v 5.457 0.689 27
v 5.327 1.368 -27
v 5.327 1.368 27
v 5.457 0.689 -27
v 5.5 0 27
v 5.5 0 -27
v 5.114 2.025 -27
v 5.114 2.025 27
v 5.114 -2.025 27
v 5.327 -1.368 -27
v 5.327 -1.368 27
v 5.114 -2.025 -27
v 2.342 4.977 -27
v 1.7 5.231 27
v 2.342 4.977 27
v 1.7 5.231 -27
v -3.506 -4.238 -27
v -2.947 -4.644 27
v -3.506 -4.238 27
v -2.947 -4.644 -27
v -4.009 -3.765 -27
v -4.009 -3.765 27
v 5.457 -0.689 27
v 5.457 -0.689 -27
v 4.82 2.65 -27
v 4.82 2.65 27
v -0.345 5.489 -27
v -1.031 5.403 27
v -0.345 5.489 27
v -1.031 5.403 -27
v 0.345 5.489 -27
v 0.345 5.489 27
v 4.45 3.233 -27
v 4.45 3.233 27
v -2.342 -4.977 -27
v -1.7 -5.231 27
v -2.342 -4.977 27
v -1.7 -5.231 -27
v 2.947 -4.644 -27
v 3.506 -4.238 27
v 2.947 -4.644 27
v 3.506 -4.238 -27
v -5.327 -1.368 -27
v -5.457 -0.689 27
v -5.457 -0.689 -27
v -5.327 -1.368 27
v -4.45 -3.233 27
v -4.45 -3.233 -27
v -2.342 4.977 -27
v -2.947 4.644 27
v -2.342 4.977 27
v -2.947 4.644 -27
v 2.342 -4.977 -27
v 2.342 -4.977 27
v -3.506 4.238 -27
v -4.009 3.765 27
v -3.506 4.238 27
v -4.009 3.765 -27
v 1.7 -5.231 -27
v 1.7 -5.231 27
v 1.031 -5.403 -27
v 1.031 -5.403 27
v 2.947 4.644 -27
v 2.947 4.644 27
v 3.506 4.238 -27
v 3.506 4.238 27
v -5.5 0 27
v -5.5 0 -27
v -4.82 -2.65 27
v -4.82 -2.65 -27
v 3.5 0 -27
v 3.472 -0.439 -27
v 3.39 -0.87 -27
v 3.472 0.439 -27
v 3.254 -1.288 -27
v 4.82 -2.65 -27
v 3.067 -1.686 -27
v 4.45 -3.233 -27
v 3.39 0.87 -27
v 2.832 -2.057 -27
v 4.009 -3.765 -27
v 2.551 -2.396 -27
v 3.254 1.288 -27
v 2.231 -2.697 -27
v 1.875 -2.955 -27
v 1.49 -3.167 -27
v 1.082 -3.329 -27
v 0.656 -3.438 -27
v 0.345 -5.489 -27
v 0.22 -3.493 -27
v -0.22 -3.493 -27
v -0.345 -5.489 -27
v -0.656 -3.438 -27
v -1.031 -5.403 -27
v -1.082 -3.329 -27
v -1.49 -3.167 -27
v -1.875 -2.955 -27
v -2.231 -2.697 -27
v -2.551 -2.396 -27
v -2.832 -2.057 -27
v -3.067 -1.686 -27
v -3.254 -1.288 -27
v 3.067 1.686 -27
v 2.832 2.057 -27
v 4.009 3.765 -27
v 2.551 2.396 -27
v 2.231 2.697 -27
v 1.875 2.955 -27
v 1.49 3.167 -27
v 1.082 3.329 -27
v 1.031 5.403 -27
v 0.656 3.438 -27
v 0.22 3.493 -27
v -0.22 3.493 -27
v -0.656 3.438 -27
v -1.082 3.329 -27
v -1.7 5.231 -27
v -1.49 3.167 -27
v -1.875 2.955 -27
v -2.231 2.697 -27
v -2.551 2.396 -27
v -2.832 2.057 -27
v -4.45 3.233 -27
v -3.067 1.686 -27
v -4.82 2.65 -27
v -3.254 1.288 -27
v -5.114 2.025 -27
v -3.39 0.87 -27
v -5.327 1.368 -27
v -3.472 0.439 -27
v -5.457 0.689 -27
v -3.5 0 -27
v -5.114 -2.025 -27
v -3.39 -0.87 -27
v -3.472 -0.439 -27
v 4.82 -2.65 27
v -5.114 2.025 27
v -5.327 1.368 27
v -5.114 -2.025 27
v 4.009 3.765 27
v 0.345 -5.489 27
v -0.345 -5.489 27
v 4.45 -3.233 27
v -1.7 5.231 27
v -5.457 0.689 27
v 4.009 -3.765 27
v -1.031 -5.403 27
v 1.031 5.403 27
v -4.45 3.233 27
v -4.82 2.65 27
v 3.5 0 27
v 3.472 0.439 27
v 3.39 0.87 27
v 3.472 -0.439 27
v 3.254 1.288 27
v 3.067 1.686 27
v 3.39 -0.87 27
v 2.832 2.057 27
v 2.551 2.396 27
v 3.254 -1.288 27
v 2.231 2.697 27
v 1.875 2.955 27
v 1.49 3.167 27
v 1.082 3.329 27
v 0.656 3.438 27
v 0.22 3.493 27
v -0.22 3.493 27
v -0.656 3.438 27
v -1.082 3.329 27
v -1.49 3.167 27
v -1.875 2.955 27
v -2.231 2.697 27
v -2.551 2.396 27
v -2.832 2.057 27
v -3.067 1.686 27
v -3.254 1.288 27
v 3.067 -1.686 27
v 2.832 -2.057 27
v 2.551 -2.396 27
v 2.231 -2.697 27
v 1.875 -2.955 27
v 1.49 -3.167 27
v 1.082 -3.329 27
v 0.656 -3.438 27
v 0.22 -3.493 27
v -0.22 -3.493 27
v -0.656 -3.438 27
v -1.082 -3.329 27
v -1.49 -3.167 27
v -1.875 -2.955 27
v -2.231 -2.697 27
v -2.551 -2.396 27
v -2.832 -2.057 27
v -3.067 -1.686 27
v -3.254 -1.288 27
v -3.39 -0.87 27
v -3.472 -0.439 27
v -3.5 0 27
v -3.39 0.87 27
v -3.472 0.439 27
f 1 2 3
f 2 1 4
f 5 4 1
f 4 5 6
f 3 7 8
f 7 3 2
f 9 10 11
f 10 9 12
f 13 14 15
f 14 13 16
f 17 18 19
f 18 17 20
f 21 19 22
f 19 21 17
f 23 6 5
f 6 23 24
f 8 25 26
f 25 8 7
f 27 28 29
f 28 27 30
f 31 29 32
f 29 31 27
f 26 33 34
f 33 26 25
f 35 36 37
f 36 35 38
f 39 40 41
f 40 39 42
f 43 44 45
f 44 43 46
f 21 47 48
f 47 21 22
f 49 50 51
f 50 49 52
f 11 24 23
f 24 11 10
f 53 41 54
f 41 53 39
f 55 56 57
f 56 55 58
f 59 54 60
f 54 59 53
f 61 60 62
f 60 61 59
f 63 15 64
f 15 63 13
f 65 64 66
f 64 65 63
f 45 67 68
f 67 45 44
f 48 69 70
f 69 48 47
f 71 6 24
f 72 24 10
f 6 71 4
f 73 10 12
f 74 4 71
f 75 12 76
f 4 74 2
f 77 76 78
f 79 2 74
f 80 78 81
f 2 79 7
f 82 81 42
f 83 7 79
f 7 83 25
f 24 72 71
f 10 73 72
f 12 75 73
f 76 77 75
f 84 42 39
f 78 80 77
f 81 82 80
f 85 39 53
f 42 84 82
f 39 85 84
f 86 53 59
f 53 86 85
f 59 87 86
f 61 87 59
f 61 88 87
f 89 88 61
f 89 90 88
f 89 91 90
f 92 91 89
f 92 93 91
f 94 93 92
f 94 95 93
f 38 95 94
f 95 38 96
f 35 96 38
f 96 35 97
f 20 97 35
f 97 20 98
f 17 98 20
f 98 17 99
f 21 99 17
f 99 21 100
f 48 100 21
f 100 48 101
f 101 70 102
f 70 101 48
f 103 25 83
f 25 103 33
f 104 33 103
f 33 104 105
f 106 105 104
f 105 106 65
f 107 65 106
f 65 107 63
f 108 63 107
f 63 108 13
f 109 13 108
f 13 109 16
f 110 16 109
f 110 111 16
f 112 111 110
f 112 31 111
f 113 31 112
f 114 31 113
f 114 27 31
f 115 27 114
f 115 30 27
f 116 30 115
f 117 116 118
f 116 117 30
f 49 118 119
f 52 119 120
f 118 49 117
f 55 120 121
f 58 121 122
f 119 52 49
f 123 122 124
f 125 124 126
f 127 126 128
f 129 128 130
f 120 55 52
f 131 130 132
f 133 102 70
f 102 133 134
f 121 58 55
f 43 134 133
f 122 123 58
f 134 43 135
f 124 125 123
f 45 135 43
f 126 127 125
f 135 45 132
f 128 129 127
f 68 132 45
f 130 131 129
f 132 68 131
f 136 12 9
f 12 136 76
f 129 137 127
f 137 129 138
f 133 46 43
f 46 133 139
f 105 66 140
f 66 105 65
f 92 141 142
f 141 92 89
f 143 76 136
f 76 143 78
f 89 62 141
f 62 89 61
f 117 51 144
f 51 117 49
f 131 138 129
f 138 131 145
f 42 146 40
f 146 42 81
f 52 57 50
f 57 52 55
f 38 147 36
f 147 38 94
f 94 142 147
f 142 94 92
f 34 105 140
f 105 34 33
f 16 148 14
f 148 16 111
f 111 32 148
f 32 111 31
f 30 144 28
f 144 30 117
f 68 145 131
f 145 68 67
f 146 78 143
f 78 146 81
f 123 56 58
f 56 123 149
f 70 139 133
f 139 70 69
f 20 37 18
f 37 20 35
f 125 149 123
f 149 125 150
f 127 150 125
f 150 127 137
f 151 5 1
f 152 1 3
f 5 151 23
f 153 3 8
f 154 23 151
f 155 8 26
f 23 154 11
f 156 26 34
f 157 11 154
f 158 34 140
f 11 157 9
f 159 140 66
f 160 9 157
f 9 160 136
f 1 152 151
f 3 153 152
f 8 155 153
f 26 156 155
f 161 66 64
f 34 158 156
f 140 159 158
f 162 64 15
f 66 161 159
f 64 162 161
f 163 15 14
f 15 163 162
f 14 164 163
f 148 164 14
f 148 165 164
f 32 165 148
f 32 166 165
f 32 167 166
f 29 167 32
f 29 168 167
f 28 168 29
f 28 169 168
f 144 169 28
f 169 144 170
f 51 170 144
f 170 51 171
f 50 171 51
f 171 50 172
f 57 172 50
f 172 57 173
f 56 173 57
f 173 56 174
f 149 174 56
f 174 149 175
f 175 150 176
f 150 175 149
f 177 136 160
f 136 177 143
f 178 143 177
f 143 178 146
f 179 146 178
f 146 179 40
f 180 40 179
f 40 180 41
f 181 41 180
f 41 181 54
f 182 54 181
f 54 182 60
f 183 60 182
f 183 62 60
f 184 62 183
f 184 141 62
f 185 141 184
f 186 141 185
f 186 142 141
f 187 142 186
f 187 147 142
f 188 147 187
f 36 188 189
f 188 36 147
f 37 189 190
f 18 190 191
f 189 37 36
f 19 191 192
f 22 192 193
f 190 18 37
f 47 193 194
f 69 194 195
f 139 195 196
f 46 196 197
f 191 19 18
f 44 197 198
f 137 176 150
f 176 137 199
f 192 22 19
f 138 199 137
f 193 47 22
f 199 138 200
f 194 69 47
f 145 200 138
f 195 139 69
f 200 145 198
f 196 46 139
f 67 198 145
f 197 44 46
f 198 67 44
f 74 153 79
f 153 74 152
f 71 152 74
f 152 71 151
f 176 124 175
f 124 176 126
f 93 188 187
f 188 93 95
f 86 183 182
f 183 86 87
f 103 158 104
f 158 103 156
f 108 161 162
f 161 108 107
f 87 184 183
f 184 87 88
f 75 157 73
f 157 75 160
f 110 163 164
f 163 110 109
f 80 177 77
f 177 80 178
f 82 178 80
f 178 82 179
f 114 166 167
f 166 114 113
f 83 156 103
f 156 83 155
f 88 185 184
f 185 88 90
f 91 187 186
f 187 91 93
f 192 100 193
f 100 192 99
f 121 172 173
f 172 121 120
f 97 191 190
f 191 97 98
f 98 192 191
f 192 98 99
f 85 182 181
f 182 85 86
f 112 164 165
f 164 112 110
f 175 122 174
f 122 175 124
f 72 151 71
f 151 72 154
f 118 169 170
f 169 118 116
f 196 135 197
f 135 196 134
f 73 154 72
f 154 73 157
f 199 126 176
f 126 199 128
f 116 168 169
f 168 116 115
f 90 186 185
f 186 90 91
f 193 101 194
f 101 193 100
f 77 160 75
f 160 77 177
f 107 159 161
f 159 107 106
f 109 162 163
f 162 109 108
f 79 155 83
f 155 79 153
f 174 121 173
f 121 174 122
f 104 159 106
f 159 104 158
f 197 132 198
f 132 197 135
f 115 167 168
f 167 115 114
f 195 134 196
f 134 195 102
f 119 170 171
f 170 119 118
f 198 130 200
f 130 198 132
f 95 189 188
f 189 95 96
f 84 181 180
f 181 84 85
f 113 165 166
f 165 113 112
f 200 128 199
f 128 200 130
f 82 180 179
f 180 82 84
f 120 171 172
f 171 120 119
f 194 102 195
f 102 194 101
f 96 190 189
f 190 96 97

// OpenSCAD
$fn = 50;


difference() {
	union() {
		translate(v = [0, 0, -27.0000000000]) {
			cylinder(h = 54, r = 5.5000000000);
		}
	}
	union() {
		translate(v = [0, 0, -100.0000000000]) {
			cylinder(h = 200, r = 3.5000000000);
		}
	}
}
